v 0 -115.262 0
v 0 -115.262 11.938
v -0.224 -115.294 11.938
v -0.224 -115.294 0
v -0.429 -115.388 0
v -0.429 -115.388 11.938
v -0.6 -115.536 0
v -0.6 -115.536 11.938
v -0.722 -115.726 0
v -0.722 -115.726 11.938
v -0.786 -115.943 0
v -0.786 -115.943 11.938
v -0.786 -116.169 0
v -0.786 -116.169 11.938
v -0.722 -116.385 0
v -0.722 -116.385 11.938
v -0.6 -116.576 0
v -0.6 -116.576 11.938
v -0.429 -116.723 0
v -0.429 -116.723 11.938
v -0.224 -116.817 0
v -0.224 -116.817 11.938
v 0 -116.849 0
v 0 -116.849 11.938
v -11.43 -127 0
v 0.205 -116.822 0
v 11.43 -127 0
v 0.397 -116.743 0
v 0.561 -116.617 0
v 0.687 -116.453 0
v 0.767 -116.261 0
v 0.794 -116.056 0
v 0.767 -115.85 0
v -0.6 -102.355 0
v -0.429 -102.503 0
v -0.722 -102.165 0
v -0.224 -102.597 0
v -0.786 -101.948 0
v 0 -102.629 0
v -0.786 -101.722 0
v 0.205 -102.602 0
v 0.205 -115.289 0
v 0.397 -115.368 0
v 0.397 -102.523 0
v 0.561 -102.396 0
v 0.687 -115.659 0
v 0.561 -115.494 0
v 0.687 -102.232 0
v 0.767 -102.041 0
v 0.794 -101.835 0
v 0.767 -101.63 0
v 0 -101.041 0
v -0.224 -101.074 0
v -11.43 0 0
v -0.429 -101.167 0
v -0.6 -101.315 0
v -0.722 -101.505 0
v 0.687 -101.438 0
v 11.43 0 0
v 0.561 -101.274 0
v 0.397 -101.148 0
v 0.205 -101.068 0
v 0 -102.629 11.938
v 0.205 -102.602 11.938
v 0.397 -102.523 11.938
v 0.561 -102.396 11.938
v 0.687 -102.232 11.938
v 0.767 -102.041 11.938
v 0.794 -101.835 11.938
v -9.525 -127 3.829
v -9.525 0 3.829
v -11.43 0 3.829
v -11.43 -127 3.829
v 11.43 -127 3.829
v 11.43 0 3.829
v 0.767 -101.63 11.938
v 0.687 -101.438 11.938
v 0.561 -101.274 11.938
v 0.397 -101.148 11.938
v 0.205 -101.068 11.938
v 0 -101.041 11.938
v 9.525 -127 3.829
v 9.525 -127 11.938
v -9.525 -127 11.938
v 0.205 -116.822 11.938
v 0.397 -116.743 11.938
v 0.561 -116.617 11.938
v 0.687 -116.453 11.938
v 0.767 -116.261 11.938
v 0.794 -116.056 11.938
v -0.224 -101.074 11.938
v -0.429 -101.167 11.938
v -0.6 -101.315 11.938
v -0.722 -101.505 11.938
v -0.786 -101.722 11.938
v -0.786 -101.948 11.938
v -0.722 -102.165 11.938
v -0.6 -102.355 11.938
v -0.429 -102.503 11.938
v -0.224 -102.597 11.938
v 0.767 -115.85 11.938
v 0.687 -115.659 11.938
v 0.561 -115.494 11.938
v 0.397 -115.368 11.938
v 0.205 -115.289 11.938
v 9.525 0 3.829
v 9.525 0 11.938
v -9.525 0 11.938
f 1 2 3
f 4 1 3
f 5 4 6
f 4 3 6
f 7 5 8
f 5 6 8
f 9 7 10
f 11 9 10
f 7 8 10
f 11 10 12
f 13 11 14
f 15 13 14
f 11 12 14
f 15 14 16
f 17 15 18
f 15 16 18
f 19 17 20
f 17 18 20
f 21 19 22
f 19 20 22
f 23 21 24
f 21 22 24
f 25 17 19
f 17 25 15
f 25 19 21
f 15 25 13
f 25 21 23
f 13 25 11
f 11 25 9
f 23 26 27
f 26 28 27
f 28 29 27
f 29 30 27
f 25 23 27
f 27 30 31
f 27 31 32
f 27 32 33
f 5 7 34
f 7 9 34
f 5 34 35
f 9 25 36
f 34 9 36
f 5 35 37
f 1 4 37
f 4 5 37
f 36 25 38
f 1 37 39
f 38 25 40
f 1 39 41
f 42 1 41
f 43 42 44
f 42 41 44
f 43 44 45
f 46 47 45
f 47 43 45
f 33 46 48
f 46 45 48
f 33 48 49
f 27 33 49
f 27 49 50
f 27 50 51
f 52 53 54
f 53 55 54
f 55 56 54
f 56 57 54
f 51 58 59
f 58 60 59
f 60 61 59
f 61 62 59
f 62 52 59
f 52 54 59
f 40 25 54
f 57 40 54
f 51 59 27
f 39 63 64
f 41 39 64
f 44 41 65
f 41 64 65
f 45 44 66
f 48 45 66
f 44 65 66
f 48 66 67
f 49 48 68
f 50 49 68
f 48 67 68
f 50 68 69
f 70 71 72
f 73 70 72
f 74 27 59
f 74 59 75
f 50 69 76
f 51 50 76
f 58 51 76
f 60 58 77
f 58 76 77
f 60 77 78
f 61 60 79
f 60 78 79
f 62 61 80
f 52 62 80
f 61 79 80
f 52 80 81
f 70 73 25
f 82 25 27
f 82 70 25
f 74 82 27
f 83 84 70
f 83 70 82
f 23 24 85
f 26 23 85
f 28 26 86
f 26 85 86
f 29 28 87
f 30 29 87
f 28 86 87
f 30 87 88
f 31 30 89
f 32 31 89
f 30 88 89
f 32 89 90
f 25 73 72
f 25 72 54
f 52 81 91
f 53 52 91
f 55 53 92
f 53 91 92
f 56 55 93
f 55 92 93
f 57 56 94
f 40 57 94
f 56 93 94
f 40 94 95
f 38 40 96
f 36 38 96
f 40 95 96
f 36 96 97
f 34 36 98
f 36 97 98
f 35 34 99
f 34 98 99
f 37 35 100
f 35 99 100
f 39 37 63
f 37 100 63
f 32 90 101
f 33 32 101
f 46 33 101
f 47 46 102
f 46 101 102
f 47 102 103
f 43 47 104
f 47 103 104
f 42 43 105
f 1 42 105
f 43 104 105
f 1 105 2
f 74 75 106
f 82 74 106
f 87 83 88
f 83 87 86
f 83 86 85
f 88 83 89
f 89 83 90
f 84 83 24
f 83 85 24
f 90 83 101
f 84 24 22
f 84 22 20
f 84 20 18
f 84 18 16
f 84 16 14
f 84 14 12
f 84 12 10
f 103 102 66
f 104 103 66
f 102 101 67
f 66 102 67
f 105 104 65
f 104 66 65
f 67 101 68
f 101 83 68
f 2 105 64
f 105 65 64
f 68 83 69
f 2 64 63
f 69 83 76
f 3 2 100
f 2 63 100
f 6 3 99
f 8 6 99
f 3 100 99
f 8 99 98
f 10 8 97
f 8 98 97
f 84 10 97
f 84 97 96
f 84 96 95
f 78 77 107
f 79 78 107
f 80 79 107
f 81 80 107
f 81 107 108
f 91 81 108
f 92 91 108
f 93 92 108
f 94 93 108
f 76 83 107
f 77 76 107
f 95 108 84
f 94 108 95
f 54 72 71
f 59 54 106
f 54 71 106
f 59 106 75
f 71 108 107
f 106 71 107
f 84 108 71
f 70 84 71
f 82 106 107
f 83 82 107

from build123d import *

# Parameters (mm, degrees)
F1_DEPTH = 127
F3_DEPTH = 25.4


with BuildPart() as f1:
    # F0 (on Front) → F1 (new body)
    with BuildSketch(Plane.XZ):
        Polygon((-11.43, 0), (0, 0), (11.43, 0), (11.43, 3.829304), (9.525, 3.829304), (9.525, 11.938), (-9.525, 11.938), (-9.525, 3.829304), (-11.43, 3.829304), align=None)
    extrude(amount=F1_DEPTH)

    # F2 (on face) → F3 (cut)
    with BuildSketch(Plane.XY.offset(11.938)):
        with BuildLine():
            ThreePointArc((0.79375, -101.8351912498), (0.5612660076, -101.2739252423), (0, -101.0414412498))
            Line((0, -101.0414412498), (0, -102.6289412498))
            ThreePointArc((0, -102.6289412498), (0.5612660076, -102.3964572574), (0.79375, -101.8351912498))
        make_face()
        with BuildLine():
            Line((0, -102.6289412498), (0, -101.0414412498))
            ThreePointArc((0, -101.0414412498), (-0.79375, -101.8351912498), (0, -102.6289412498))
        make_face()
        with BuildLine():
            Line((0, -116.8494993567), (0, -115.2619993567))
            ThreePointArc((0, -115.2619993567), (-0.79375, -116.0557493567), (0, -116.8494993567))
        make_face()
        with BuildLine():
            ThreePointArc((0.79375, -116.0557493567), (0.5612660076, -115.4944833492), (0, -115.2619993567))
            Line((0, -115.2619993567), (0, -116.8494993567))
            ThreePointArc((0, -116.8494993567), (0.5612660076, -116.6170153643), (0.79375, -116.0557493567))
        make_face()
    extrude(amount=-F3_DEPTH, mode=Mode.SUBTRACT)


solid = f1.part
